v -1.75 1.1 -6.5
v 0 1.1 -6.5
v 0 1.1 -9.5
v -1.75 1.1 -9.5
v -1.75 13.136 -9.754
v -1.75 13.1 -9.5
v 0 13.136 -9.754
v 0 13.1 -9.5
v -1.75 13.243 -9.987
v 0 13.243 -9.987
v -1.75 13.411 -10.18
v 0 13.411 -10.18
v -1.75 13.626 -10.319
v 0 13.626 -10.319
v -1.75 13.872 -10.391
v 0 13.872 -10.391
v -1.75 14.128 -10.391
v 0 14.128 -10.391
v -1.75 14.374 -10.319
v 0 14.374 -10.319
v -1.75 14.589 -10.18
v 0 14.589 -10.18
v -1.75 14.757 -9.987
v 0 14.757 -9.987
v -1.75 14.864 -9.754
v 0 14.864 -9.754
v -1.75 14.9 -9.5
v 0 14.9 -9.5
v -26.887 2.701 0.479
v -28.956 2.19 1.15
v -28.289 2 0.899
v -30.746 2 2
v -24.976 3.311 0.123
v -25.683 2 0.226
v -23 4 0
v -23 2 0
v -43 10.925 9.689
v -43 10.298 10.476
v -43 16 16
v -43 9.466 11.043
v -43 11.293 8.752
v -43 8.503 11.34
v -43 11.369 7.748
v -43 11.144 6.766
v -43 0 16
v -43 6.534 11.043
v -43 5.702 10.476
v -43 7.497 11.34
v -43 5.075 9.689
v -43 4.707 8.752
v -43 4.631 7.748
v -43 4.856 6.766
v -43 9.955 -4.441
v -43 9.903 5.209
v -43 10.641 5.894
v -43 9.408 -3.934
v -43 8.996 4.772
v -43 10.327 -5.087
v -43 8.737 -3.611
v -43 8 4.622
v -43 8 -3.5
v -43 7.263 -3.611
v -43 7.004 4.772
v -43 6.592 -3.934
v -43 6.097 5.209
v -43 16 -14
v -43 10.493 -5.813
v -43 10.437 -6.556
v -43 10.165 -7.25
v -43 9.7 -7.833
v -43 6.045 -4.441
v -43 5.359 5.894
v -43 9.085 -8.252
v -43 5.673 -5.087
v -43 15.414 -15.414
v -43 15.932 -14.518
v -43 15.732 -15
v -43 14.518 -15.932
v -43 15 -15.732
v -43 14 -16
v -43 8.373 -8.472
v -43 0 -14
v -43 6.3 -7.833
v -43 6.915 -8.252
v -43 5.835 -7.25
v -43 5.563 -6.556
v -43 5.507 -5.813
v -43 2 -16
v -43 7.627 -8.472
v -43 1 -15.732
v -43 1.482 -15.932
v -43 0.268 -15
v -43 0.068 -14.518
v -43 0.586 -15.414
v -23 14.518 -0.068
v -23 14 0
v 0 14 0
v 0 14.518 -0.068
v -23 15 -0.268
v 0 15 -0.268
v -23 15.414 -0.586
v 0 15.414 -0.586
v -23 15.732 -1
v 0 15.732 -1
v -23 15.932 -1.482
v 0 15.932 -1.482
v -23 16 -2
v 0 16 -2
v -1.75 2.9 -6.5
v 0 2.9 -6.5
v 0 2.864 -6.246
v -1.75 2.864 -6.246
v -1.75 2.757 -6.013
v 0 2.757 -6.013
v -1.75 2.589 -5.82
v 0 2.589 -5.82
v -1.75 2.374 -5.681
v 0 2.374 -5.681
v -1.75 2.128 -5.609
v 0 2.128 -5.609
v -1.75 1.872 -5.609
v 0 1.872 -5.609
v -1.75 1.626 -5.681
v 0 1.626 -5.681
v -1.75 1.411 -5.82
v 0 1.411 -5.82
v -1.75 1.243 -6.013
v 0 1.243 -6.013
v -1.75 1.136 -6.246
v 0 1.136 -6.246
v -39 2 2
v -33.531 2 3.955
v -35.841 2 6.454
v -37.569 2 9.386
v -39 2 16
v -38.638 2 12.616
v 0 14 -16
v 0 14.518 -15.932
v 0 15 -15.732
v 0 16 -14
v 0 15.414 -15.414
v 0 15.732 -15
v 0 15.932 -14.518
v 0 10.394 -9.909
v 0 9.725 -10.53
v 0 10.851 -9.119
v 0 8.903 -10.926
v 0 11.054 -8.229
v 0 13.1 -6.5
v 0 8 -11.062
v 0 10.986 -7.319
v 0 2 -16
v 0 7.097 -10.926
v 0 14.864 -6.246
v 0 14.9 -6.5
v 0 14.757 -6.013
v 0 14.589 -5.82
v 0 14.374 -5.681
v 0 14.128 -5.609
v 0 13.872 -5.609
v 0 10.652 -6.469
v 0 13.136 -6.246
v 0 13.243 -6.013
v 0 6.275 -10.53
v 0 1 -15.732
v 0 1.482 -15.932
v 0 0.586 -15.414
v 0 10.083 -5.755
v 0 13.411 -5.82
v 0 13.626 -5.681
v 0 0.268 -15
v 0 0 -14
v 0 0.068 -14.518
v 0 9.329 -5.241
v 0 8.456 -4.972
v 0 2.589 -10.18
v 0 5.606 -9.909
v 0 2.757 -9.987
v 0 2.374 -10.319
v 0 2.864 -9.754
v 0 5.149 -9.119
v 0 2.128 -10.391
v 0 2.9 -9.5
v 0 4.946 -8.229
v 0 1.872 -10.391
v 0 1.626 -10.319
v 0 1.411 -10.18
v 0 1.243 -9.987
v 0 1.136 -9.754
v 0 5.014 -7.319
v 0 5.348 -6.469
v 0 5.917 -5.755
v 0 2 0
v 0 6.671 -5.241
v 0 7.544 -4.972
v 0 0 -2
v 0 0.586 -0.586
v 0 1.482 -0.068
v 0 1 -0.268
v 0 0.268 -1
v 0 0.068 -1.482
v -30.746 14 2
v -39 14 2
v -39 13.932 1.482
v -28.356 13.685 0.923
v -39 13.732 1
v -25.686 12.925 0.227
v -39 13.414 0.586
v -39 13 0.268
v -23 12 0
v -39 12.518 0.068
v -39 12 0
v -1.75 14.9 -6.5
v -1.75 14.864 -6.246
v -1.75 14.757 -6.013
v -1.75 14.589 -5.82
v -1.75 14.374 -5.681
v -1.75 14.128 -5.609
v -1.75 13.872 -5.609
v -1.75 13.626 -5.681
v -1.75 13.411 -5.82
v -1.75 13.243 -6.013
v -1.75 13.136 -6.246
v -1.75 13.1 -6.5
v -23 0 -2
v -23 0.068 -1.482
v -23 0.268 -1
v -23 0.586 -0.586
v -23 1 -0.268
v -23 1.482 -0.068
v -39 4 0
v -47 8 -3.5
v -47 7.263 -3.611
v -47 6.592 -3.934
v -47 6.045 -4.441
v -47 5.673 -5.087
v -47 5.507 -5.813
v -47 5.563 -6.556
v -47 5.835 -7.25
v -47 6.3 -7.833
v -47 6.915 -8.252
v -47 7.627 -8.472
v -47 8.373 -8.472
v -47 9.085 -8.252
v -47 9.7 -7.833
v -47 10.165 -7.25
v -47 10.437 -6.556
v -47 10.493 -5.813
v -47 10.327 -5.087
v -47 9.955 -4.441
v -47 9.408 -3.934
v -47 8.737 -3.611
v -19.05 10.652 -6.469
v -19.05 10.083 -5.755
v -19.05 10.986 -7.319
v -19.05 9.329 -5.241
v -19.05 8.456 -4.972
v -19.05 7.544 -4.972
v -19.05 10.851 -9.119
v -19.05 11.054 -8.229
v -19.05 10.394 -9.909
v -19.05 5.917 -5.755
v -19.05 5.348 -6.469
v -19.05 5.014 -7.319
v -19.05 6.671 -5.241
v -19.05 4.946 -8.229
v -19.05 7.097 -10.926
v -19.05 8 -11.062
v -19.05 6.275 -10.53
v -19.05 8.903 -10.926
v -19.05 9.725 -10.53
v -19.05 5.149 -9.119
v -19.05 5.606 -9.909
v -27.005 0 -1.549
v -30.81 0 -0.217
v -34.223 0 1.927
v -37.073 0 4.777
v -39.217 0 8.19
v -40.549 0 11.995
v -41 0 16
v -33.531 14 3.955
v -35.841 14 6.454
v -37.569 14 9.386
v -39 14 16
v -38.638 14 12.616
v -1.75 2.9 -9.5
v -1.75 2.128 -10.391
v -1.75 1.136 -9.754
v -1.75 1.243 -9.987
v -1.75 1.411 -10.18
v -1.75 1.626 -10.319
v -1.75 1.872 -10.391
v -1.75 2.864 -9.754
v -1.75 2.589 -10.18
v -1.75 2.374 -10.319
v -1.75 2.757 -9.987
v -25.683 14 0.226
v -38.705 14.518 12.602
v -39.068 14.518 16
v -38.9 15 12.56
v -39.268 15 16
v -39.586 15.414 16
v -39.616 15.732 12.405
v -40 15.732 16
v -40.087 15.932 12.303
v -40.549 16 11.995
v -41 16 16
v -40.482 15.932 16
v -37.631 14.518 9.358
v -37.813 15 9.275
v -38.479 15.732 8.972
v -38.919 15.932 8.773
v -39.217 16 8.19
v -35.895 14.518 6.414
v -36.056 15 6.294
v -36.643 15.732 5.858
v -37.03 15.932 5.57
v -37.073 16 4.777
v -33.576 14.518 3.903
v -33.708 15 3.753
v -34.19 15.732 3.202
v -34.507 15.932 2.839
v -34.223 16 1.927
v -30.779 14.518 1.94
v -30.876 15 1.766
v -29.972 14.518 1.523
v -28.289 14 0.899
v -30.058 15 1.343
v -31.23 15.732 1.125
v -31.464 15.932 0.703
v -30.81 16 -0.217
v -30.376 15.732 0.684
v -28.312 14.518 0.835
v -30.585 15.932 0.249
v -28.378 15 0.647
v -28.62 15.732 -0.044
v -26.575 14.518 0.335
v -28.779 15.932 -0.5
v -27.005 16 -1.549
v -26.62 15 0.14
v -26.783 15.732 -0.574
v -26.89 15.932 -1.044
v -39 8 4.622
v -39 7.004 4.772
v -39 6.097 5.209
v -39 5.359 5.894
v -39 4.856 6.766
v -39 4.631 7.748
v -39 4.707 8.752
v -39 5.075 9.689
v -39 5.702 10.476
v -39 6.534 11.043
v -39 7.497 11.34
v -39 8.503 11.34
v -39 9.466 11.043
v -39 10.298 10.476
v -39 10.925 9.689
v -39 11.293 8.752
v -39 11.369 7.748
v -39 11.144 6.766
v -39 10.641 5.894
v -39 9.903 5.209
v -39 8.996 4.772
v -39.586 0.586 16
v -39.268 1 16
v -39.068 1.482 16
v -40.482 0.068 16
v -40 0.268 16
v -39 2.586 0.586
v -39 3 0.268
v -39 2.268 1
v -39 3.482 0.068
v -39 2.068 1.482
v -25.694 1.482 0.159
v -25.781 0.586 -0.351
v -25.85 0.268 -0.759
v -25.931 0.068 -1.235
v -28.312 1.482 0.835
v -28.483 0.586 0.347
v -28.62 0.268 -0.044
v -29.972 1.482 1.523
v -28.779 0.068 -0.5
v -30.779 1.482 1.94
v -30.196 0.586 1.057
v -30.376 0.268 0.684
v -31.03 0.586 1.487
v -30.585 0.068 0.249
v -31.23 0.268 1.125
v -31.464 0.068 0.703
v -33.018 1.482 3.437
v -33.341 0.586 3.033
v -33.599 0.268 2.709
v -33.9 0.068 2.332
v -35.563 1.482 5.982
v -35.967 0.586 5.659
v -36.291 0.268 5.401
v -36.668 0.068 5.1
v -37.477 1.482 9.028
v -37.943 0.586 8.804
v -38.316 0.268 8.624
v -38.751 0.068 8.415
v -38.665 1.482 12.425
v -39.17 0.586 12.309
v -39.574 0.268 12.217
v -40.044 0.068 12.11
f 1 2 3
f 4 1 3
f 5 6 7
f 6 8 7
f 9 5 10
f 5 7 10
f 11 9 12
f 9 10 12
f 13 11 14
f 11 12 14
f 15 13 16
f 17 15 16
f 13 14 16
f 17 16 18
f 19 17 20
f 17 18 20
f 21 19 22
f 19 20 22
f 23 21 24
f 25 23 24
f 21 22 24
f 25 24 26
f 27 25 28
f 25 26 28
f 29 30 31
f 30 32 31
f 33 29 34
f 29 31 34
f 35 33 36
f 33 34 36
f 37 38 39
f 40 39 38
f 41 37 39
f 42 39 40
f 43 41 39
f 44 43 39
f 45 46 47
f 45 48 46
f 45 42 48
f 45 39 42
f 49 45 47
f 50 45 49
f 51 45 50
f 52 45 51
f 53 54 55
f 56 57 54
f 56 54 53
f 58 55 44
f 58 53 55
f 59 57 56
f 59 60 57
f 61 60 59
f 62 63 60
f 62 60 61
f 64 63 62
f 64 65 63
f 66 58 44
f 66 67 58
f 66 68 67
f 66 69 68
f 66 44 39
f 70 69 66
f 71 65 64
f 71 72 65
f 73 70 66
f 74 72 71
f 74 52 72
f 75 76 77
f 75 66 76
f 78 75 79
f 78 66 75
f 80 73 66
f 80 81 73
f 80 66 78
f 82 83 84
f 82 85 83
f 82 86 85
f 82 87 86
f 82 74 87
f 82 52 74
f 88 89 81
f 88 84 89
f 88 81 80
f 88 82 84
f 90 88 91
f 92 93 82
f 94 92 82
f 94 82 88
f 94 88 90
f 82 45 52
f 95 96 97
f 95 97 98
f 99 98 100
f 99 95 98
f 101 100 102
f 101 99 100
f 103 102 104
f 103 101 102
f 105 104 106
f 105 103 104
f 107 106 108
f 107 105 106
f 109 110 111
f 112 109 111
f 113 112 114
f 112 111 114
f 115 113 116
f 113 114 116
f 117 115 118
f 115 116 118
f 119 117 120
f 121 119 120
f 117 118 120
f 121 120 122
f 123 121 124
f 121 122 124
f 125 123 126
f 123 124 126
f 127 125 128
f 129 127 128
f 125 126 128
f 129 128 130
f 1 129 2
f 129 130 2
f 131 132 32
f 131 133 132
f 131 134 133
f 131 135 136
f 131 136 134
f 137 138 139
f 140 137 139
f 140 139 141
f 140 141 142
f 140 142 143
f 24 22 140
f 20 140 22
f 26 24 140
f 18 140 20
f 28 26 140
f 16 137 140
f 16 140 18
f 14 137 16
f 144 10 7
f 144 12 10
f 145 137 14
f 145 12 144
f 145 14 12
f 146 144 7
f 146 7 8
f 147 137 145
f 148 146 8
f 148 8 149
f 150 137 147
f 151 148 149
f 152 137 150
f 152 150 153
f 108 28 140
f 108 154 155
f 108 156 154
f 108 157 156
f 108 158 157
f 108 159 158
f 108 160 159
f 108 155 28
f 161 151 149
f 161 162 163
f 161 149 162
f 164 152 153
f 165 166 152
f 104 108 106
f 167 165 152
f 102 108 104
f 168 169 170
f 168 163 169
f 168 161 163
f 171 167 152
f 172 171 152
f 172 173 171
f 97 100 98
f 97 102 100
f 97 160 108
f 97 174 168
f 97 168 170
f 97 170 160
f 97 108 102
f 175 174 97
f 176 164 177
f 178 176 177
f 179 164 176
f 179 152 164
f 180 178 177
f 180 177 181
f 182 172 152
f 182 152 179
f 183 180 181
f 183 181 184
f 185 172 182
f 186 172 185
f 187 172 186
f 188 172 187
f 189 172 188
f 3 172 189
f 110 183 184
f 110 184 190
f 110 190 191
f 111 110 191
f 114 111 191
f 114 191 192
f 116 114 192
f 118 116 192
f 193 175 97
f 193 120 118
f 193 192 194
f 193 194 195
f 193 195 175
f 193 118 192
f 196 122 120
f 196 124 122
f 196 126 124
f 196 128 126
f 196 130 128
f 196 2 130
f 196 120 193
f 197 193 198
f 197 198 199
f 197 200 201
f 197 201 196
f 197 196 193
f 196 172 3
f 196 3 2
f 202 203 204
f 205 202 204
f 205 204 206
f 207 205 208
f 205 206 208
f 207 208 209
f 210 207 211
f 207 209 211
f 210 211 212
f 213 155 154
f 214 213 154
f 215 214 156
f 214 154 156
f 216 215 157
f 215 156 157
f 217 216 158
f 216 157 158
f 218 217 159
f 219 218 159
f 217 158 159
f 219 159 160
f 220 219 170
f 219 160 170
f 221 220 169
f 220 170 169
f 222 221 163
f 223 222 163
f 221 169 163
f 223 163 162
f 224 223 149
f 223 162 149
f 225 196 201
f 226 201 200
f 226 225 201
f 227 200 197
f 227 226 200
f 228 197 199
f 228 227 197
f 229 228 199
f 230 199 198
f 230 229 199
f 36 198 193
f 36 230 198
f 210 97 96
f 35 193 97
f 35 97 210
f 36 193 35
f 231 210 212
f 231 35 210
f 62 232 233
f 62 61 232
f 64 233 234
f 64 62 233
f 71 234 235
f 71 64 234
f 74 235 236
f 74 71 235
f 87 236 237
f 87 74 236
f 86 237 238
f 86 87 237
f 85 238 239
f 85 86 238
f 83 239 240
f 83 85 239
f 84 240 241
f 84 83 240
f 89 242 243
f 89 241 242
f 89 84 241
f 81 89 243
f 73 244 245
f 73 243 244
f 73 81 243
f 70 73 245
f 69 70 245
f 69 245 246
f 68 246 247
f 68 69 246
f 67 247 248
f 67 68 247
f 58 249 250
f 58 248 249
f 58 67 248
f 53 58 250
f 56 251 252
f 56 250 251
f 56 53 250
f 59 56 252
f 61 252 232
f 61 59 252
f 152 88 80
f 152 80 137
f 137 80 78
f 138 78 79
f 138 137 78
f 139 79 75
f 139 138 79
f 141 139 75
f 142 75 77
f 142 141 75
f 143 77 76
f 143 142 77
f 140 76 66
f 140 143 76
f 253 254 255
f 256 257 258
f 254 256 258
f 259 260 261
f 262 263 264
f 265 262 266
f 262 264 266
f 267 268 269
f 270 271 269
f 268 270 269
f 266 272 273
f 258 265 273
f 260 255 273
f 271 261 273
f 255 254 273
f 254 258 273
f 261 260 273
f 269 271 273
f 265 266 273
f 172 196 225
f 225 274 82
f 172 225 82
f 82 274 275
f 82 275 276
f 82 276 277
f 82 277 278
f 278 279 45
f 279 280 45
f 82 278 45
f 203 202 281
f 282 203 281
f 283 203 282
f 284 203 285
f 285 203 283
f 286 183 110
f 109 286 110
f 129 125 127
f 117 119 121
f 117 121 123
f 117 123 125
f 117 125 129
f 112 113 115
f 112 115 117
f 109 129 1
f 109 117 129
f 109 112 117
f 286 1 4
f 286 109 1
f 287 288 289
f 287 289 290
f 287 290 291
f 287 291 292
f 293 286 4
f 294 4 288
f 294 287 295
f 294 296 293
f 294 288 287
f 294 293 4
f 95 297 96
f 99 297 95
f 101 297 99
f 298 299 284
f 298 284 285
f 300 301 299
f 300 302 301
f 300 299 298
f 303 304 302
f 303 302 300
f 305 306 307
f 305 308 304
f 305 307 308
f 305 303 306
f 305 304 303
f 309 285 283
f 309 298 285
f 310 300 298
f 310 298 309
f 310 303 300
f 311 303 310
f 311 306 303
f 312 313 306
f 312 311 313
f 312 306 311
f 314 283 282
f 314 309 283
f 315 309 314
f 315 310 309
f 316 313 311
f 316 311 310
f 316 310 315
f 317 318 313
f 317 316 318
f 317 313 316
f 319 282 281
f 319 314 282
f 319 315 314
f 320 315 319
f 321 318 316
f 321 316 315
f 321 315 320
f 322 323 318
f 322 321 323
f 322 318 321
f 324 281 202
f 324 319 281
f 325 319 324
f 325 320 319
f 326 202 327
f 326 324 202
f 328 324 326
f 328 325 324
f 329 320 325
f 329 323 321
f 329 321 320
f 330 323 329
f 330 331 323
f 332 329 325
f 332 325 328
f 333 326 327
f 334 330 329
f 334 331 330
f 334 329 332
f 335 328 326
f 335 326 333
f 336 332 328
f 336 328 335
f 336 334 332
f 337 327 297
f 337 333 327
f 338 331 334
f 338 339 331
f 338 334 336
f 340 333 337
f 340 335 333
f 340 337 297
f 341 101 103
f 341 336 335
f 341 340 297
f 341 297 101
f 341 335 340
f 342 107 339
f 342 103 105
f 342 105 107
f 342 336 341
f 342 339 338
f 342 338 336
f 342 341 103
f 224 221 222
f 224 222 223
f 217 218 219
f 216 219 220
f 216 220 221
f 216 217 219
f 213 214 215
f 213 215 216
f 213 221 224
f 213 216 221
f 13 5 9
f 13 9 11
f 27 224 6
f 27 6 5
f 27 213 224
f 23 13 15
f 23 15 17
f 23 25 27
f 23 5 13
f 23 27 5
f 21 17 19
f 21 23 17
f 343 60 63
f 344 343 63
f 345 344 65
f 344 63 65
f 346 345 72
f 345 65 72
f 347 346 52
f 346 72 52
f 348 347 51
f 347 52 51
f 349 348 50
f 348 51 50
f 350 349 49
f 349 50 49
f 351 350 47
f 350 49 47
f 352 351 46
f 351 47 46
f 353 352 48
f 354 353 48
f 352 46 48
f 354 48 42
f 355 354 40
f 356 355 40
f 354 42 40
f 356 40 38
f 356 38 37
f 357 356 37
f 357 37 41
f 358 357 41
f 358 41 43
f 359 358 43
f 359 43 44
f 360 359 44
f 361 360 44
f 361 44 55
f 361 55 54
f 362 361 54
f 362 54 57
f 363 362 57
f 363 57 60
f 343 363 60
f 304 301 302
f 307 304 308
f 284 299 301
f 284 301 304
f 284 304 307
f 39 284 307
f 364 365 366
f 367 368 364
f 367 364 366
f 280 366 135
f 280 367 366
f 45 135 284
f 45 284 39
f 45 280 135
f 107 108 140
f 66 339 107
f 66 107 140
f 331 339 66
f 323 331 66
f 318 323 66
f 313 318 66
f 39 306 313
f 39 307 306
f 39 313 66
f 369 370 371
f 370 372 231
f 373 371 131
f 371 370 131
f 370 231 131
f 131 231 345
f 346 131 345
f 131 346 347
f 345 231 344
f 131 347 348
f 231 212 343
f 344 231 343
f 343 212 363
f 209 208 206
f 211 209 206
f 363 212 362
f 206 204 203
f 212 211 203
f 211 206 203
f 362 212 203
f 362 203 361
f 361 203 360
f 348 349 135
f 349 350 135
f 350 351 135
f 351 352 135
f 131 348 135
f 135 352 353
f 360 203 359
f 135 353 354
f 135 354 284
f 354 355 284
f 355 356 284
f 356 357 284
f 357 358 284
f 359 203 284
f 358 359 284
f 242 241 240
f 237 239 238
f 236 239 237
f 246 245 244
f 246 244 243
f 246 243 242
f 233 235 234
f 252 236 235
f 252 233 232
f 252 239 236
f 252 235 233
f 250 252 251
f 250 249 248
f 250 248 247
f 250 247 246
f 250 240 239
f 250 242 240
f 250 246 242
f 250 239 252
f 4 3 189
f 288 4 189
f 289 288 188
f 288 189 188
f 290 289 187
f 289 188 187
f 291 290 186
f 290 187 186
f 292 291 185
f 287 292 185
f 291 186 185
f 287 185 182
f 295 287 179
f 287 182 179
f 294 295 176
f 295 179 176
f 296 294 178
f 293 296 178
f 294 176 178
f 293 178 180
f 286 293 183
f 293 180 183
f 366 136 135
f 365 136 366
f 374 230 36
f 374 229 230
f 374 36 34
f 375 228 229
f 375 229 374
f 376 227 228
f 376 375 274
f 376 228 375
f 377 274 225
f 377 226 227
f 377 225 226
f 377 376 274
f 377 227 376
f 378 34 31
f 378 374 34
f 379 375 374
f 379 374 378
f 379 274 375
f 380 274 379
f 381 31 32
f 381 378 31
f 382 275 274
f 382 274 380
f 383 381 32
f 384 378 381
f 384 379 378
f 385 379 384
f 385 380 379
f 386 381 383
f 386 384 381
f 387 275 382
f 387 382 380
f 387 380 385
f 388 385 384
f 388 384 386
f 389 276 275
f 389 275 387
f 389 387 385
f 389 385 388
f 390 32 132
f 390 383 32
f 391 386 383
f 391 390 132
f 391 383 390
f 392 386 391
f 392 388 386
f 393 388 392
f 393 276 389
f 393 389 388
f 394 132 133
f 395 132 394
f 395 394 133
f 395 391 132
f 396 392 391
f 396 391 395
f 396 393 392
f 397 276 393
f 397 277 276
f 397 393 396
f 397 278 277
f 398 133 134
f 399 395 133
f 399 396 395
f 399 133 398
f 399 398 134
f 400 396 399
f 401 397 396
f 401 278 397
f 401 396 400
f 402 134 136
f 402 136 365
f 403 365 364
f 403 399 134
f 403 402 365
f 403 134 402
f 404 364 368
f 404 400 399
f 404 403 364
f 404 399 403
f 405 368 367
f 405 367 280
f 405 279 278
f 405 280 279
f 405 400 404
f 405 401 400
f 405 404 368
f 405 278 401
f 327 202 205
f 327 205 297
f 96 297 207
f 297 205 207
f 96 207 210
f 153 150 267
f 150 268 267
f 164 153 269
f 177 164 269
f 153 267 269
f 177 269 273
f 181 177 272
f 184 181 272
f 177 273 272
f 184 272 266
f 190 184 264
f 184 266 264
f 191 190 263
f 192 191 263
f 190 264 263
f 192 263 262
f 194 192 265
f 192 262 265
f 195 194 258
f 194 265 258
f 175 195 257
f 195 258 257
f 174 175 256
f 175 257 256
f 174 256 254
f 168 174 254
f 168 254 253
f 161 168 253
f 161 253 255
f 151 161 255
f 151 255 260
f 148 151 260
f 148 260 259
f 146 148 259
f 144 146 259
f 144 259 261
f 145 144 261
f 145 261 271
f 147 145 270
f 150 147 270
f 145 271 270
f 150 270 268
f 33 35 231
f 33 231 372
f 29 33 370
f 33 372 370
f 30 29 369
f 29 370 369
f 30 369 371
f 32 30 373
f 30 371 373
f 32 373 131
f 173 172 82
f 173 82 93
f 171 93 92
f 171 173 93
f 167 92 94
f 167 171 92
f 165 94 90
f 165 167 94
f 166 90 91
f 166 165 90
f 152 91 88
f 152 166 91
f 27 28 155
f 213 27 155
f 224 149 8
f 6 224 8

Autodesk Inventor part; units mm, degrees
ref_plane "YZ Plane" through (0, 0, 0) normal (1, 0, 0) x (0, 1, 0)
ref_plane "XZ Plane" through (0, 0, 0) normal (0, 1, 0) x (-1, 0, 0)
sketch "Sketch1" plane through (0, 0, 0) normal (0, 1, 0) x (-1, 0, 0)
  line L0 (43, 16) -> (43, -16)
  line L1 (43, -16) -> (0, -16)
  line L2 (0, -16) -> (0, 0)
  line L3 (0, 0) -> (23, 0)
  line L4 (39, 16) -> (39, 16)
  line L5 (39, 16) -> (43, 16)
  arc A0 (23, 0) -> (39, 16) centre (23, 16) ccw
  dimension "d0" = 16
  dimension "d1" = 32
  dimension "d2" = 4
  dimension "d3" = 16
  dimension "d4" = 43
extrude "Extrusion1" add sketch "Sketch1" along normal blind 16
fillet "Fillet1" radius 2 6 edges at (-34.3137, 16, 4.6863) (-11.5, 16, 0) (-21.5, 16, -16) (-21.5, 0, -16) (-34.3137, 0, 4.6863) (-11.5, 0, 0)
ref_plane "Work Plane1" through (-39, 0, 16) normal (-1, 0, 0) x (0, 0, 1)
sketch "Sketch2" plane through (-39, 0, 16) normal (-1, 0, 0) x (0, 0, 1)
  line L0 (-16, 14) -> (0, 14) projected
  line L1 (0, 2) -> (-16, 2) projected
  line L2 (-14, 14) -> (0, 14)
  line L3 (0, 14) -> (0, 2)
  line L4 (0, 2) -> (-14, 2)
  line L5 (-16, 4) -> (-16, 12)
  arc A0 (-14, 14) -> (-16, 12) centre (-14, 12) ccw
  arc A1 (-16, 4) -> (-14, 2) centre (-14, 4) ccw
  point P0 (-16, 0)
  dimension "d9" = 2
  dimension "d10" = 16
extrude "Extrusion2" cut sketch "Sketch2" against normal blind 16
sketch "Sketch3" plane through (-39, 0, 16) normal (1, 0, 0) x (0, 0, -1)
  line L0 (0, 0) -> (18, 0) projected
  line L1 (18, 16) -> (0, 16) projected
  line L2 (0, 2) -> (0, 14) projected
  point P0 (16, 0)
  point P1 (8, 8)
  dimension "d13" = 16
  dimension "d14" = 8
  dimension "d15" = 8
hole "Hole1" at (-39, 8, 8) direction (-1, 0, 0) diameter 6.756 depth 8.8 clearance for "Flat Head Machine Screw (82)" size "1/4" standard "Ansi Unified Screw Threads"
sketch "Sketch4" plane through (0, 0, -2) normal (1, 0, 0) x (0, 0, -1)
  line L0 (0, 16) -> (12, 16) projected
  line L1 (14, 2) -> (14, 14) projected
  line L2 (4.5, 14) -> (7.5, 14) construction
  line L3 (4.5, 13.1) -> (7.5, 13.1)
  line L4 (7.5, 14.9) -> (4.5, 14.9)
  arc A0 (4.5, 14.9) -> (4.5, 13.1) centre (4.5, 14) ccw
  arc A1 (7.5, 13.1) -> (7.5, 14.9) centre (7.5, 14) ccw
  line L5 (7.5, 2) -> (4.5, 2) construction
  line L6 (7.5, 2.9) -> (4.5, 2.9)
  line L7 (4.5, 1.1) -> (7.5, 1.1)
  arc A2 (7.5, 1.1) -> (7.5, 2.9) centre (7.5, 2) ccw
  arc A3 (4.5, 2.9) -> (4.5, 1.1) centre (4.5, 2) ccw
  point P0 (-2, 0)
  point P1 (6, 8)
  point P2 (6, 8)
  point P3 (6, 8)
  point P4 (6, 14)
  point P5 (6, 2)
  dimension "d23" = 8
  dimension "d24" = 8
  dimension "d62" = 0
  dimension "d63" = 1.8
  dimension "d64" = 12
  dimension "d65" = 6
  dimension "d66" = 1.8
  dimension "d67" = 3
  dimension "d68" = 0
  dimension "d69" = 3
extrude "Extrusion3" cut sketch "Sketch4" against normal blind 1.75
hole "Hole2" at (0, 8, -8) direction (-1, 0, 0) diameter 6.125 depth 19.05
sketch "Sketch5" plane through (-43, 0, 16) normal (-1, 0, 0) x (0, 0, 1)
  circle A0 centre (-22, 8) radius 2.5
  line L0 (-8, 8) -> (-22, 8) construction
  circle A1 centre (-8, 8) radius 3.378 construction
  point P0 (-16, 0)
  dimension "d42" = 14
  dimension "d43" = 5
extrude "Extrusion4" add sketch "Sketch5" along normal blind 4
equation "\"d1\" = 2 * d0"
equation "\"d14\" = 0.5 * d13"
equation "\"d15\" = 0.5 * d13"
equation "\"d24\" = d23"
equation "\"d65\" = 0.5 * d64"
equation "\"d66\" = d63"
equation "\"d69\" = d67"
properties part number "vive_mount"
